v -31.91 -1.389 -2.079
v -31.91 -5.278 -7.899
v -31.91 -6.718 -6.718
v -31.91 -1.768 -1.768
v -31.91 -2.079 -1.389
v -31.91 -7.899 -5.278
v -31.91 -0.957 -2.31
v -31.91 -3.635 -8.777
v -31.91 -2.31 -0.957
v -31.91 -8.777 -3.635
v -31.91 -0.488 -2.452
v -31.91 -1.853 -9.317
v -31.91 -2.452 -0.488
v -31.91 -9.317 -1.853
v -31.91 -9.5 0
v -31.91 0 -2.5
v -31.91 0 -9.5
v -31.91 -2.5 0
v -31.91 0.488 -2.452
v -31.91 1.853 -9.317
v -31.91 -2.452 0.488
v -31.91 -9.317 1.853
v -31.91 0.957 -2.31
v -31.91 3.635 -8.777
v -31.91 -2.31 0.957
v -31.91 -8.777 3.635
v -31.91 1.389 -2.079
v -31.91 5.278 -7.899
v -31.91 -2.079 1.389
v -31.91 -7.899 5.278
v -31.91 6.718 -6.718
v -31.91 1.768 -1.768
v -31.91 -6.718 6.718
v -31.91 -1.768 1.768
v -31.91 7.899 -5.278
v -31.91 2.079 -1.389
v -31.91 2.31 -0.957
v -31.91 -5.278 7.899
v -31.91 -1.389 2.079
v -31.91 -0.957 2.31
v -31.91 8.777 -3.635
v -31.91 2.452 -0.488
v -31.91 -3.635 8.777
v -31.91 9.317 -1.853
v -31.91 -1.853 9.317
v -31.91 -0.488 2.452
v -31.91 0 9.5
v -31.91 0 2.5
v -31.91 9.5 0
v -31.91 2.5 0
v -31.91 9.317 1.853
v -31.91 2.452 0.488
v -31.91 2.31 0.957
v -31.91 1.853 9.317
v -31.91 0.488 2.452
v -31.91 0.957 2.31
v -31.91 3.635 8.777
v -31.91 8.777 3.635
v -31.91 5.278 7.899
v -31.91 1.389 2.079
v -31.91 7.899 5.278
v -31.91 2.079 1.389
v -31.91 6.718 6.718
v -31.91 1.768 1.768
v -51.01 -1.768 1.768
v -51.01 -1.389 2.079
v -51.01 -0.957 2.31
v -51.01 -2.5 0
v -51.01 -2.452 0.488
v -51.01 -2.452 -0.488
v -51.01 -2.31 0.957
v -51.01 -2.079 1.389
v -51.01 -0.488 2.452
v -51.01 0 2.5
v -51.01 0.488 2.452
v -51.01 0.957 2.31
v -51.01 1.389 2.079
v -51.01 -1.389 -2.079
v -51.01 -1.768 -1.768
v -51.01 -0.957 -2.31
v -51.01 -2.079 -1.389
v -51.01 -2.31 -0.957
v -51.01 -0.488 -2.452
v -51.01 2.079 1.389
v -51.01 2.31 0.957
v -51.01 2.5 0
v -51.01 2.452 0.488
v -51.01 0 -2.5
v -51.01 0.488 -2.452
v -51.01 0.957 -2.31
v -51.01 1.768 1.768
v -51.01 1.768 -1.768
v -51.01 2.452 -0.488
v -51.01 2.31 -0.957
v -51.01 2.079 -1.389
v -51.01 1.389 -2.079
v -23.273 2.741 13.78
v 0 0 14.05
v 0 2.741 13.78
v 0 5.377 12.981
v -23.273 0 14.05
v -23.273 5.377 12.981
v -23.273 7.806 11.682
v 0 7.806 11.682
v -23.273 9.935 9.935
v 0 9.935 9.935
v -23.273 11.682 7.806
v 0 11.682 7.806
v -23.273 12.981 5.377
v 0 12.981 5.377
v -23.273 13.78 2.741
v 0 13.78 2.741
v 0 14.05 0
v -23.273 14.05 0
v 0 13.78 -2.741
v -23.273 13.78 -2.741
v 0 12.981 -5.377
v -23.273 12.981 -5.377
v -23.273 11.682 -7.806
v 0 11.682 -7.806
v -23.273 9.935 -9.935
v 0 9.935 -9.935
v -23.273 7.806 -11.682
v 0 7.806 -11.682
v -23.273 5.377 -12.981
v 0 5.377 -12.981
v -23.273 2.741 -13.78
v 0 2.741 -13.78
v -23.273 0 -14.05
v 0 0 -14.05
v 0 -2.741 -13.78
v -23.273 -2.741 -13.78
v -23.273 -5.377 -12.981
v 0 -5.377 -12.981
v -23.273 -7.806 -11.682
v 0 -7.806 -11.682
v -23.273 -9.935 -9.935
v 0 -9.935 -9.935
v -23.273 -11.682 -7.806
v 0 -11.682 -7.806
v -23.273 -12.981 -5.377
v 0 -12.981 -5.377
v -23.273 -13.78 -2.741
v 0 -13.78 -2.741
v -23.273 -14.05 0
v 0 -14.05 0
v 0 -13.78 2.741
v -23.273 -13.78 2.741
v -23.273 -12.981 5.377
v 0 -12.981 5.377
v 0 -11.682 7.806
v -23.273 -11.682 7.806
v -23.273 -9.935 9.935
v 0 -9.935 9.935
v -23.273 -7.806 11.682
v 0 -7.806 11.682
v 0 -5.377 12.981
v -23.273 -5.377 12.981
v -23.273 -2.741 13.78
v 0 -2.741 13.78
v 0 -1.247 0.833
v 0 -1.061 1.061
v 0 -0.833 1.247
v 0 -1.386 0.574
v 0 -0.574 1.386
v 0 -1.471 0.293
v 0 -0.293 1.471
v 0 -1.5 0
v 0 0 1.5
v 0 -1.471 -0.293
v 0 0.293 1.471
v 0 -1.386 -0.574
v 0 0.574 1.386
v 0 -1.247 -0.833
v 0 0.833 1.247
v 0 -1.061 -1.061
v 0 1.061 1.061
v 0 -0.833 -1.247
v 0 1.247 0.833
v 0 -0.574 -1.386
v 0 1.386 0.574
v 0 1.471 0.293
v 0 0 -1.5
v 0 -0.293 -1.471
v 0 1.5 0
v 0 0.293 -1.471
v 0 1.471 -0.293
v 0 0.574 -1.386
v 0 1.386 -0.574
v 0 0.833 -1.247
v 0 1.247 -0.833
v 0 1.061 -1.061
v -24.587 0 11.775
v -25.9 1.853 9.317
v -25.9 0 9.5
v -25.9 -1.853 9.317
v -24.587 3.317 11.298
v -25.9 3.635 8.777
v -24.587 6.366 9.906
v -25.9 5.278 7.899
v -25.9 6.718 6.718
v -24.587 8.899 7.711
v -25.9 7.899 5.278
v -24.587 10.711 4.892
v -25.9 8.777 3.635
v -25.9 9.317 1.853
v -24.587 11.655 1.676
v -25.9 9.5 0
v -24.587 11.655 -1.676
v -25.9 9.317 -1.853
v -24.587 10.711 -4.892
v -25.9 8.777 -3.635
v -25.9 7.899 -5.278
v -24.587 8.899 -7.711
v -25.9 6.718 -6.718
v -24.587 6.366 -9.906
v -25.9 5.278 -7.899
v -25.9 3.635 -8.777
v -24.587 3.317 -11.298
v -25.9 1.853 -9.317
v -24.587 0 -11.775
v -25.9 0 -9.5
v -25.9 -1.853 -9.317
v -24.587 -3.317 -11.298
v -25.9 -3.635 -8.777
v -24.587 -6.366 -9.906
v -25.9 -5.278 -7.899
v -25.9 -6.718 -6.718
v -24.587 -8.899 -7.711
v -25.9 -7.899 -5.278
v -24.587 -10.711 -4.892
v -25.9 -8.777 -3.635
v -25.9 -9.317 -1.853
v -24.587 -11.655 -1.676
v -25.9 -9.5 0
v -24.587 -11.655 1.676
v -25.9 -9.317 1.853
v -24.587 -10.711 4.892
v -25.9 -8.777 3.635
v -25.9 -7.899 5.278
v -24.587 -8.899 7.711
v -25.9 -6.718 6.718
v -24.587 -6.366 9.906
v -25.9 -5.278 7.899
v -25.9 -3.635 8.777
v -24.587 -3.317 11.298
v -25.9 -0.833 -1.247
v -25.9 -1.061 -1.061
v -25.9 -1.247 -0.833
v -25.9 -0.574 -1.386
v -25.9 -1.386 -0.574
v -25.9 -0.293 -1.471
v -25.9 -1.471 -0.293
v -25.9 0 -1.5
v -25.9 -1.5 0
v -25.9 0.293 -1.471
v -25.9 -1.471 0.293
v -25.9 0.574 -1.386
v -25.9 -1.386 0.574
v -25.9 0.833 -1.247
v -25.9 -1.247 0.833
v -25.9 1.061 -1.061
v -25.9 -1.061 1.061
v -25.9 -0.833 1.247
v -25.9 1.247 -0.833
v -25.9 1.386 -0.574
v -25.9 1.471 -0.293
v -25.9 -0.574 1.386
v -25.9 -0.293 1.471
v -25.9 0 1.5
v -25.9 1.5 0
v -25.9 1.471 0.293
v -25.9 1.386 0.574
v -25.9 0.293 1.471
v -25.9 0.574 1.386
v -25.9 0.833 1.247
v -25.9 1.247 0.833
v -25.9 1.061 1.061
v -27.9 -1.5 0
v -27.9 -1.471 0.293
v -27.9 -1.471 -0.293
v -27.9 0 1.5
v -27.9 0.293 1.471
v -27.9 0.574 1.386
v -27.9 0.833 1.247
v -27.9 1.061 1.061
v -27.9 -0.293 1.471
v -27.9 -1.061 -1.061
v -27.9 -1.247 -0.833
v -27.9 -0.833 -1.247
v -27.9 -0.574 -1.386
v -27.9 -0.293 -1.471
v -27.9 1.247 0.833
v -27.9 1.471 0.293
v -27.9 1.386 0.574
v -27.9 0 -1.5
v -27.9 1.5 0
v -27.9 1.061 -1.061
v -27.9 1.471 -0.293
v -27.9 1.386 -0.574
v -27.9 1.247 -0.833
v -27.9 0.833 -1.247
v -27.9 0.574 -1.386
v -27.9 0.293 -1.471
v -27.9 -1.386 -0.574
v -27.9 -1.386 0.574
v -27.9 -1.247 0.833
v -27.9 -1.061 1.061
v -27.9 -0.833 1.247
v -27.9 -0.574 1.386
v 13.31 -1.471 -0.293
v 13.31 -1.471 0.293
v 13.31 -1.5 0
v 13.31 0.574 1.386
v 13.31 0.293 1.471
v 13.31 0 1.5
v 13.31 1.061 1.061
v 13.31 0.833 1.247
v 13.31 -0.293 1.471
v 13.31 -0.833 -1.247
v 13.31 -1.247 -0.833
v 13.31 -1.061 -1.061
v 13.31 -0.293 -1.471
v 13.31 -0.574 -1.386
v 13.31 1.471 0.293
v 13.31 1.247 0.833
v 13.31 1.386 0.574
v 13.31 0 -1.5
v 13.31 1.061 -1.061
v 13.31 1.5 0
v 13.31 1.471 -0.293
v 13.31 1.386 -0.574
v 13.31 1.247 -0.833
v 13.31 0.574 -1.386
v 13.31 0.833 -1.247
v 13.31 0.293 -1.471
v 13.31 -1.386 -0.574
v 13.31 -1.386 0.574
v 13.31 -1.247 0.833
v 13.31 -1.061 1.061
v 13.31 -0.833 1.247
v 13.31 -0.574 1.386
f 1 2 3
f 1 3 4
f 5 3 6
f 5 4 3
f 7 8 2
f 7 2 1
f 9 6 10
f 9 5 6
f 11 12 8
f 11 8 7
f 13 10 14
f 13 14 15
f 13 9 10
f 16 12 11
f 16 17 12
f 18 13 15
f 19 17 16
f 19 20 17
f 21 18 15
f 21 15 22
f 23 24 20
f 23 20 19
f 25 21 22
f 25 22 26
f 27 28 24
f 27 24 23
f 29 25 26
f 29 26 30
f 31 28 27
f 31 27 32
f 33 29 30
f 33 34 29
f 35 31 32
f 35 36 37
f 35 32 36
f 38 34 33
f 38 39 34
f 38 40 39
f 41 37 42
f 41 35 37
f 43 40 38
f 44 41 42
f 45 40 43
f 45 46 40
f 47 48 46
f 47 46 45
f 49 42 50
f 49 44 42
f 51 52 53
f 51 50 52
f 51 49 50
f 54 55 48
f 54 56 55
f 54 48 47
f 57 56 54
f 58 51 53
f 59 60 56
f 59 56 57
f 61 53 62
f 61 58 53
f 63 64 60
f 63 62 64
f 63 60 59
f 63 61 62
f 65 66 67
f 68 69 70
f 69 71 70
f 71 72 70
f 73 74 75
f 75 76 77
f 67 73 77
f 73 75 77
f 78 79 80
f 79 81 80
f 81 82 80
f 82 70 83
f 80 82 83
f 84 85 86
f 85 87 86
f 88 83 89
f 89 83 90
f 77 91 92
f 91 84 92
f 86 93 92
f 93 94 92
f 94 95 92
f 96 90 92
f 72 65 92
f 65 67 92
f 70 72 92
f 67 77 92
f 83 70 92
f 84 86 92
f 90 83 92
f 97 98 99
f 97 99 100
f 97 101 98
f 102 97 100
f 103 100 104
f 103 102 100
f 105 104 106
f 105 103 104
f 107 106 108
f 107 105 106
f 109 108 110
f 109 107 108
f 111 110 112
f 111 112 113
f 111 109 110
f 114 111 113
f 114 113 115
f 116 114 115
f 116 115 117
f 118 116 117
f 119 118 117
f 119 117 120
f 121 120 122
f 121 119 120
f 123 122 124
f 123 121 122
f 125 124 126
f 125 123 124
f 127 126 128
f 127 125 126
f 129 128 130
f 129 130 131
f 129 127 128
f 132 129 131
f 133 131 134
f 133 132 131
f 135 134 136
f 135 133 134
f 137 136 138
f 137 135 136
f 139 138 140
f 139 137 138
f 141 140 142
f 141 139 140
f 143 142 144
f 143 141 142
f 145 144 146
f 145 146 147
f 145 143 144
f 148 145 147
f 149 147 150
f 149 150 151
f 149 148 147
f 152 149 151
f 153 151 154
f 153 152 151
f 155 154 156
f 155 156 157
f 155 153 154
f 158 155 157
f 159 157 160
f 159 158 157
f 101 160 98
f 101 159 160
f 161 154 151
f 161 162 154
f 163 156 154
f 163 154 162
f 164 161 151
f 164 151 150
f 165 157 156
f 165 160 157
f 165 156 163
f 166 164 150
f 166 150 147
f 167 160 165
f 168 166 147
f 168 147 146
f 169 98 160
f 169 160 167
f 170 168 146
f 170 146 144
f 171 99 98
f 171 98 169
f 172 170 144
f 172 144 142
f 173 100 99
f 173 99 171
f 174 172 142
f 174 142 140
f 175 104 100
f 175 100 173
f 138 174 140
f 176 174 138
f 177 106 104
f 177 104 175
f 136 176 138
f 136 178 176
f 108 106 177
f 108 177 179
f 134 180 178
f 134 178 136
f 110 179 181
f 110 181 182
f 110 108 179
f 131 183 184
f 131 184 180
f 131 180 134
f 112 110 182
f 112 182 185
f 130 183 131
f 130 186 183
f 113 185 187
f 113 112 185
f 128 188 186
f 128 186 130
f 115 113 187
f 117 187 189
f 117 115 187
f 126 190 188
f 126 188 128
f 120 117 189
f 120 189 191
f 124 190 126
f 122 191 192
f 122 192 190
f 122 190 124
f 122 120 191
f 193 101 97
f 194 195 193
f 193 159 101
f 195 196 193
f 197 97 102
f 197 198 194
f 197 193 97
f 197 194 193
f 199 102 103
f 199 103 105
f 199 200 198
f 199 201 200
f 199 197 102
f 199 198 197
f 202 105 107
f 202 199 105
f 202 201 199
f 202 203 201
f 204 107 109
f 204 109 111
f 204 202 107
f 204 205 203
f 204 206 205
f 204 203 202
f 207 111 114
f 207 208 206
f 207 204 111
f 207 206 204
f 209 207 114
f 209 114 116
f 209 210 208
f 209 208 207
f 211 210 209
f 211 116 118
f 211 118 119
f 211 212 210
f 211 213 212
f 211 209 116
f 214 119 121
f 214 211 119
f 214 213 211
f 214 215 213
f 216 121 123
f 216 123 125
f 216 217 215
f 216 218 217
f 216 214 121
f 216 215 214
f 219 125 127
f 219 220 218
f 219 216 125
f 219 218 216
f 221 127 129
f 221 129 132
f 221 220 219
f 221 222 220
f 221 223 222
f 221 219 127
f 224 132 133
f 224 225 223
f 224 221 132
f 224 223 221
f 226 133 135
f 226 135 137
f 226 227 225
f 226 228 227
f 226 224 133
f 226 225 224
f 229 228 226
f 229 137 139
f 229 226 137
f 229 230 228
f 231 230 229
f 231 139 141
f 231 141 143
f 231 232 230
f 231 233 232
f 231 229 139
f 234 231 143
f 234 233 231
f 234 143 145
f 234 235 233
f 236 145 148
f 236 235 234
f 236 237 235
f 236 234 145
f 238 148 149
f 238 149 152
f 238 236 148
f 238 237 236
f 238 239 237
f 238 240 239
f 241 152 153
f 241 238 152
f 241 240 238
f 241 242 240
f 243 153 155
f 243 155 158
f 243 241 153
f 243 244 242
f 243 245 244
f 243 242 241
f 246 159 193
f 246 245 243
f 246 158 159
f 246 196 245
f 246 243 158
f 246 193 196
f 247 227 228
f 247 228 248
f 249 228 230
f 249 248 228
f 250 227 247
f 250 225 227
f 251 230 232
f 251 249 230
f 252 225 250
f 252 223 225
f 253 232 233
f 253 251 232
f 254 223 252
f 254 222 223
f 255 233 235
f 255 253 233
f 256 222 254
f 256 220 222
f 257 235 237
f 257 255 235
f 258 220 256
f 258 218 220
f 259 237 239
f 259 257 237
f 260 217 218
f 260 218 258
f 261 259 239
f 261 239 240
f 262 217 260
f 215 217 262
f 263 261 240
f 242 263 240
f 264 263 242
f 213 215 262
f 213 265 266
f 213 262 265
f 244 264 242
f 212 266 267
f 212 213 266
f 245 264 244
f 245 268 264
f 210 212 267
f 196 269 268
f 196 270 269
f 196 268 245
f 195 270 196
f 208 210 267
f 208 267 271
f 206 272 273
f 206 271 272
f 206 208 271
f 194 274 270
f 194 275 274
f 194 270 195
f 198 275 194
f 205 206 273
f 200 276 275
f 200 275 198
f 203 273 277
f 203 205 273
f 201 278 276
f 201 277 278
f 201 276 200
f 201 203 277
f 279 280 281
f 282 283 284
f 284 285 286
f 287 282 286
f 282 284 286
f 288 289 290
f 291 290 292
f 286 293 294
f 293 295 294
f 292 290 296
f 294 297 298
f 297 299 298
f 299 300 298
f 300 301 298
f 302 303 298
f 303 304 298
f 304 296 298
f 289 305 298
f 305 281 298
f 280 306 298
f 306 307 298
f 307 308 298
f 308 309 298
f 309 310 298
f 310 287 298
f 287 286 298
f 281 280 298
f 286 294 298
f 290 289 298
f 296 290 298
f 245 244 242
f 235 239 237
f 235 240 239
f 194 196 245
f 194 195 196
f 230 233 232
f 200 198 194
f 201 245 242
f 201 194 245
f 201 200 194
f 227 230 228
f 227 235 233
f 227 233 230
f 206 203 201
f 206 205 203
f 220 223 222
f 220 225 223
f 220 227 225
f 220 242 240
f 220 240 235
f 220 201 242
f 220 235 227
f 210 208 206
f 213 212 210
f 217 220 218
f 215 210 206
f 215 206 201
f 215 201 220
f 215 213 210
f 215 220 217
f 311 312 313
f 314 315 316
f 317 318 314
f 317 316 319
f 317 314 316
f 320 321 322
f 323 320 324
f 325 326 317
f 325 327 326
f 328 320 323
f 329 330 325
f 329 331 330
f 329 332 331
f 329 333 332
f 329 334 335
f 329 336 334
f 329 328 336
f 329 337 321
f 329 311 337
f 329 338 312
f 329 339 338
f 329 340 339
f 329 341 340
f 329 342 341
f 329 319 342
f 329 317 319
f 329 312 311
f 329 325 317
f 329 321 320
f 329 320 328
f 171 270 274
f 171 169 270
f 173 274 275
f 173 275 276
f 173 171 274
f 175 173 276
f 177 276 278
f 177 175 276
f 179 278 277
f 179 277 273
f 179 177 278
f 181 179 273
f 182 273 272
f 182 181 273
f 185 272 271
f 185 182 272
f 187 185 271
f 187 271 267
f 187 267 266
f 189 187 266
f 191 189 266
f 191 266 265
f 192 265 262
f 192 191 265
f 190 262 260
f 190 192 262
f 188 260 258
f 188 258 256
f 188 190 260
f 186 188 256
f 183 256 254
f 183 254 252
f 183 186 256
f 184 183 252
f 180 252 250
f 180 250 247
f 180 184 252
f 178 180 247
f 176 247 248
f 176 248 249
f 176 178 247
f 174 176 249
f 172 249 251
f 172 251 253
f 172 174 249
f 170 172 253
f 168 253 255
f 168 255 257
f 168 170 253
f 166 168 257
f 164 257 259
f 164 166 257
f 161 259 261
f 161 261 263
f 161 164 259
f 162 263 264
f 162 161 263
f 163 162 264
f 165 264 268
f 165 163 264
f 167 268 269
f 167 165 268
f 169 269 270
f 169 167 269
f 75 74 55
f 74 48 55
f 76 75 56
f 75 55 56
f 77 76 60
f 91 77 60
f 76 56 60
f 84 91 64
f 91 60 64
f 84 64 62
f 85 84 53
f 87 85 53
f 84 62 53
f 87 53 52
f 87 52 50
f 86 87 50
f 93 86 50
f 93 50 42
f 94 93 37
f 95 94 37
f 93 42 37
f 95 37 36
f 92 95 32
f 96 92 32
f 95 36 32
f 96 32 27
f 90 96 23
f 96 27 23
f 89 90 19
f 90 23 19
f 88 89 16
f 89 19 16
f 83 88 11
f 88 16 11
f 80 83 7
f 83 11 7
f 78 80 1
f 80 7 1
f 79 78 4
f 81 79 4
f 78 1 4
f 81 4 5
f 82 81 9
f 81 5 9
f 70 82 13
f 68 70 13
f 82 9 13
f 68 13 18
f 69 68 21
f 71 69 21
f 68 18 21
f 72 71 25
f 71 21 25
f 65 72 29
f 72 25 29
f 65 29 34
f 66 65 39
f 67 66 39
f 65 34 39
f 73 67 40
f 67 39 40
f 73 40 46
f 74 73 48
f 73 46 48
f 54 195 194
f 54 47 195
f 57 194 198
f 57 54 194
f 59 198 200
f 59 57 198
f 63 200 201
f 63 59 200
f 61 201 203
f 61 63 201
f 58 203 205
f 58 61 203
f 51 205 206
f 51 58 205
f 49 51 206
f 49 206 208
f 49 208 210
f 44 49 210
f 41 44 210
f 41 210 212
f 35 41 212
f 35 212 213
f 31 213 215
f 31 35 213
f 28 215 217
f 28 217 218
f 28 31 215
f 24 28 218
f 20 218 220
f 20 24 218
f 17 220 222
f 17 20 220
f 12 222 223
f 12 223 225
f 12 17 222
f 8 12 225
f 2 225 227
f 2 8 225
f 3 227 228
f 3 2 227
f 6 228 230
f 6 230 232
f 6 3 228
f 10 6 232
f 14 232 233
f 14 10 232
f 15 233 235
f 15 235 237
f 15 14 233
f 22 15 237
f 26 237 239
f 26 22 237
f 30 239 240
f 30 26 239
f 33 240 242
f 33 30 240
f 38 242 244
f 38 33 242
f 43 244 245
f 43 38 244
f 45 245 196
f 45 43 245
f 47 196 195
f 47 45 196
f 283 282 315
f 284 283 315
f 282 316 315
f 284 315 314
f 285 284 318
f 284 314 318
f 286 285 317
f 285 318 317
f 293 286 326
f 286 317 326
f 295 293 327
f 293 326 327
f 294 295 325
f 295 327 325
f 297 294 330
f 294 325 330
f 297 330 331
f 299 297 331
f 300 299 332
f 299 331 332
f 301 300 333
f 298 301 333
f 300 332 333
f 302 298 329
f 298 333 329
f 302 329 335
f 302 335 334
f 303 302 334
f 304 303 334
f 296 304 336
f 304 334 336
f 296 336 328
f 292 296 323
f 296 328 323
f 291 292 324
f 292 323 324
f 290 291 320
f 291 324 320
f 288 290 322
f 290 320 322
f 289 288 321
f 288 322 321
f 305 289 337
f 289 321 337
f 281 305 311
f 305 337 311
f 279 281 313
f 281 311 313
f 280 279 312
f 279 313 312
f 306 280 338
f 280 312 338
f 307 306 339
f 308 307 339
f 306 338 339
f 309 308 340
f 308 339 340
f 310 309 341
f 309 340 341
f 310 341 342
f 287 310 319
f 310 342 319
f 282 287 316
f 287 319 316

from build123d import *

# Parameters (mm, degrees)
F1_W = 13.31
F1_H = 1.5
F2_W = 41.21
F2_H = 1.5
F3_W = 19.1
F3_H = 2.5


with BuildPart() as f4:
    # F1 (on Front) → F4 (revolve)
    with BuildSketch(Plane.XZ):
        with Locations((6.655, 0.75)):
            Rectangle(F1_W, F1_H)
    revolve(axis=Axis((-18.85, 0, 0), (-1, 0, 0)))

    # F2 (on Front) → F5 (revolve)
    with BuildSketch(Plane.XZ):
        with Locations((-7.295, 0.75)):
            Rectangle(F2_W, F2_H)
    revolve(axis=Axis((-18.85, 0, 0), (-1, 0, 0)))


with BuildPart() as f4b:
    # F1 (on Front) → F4, piece 2 (revolve)
    with BuildSketch(Plane.XZ):
        Polygon((0, 14.05), (-23.2730562752, 14.05), (-25.9, 9.5), (-25.9, 1.5), (0, 1.5), align=None)
    revolve(axis=Axis((-18.85, 0, 0), (-1, 0, 0)))


with BuildPart() as f6:
    # F3 (on Front) → F6 (revolve)
    with BuildSketch(Plane.XZ):
        with Locations((-41.46, 1.25)):
            Rectangle(F3_W, F3_H)
        Polygon((-25.9, 9.5), (-31.91, 9.5), (-31.91, 2.5), (-31.91, 0), (-25.9, 0), align=None)
    revolve(axis=Axis((-18.85, 0, 0), (-1, 0, 0)))


solid = Compound([f4.part, f4b.part, f6.part])
